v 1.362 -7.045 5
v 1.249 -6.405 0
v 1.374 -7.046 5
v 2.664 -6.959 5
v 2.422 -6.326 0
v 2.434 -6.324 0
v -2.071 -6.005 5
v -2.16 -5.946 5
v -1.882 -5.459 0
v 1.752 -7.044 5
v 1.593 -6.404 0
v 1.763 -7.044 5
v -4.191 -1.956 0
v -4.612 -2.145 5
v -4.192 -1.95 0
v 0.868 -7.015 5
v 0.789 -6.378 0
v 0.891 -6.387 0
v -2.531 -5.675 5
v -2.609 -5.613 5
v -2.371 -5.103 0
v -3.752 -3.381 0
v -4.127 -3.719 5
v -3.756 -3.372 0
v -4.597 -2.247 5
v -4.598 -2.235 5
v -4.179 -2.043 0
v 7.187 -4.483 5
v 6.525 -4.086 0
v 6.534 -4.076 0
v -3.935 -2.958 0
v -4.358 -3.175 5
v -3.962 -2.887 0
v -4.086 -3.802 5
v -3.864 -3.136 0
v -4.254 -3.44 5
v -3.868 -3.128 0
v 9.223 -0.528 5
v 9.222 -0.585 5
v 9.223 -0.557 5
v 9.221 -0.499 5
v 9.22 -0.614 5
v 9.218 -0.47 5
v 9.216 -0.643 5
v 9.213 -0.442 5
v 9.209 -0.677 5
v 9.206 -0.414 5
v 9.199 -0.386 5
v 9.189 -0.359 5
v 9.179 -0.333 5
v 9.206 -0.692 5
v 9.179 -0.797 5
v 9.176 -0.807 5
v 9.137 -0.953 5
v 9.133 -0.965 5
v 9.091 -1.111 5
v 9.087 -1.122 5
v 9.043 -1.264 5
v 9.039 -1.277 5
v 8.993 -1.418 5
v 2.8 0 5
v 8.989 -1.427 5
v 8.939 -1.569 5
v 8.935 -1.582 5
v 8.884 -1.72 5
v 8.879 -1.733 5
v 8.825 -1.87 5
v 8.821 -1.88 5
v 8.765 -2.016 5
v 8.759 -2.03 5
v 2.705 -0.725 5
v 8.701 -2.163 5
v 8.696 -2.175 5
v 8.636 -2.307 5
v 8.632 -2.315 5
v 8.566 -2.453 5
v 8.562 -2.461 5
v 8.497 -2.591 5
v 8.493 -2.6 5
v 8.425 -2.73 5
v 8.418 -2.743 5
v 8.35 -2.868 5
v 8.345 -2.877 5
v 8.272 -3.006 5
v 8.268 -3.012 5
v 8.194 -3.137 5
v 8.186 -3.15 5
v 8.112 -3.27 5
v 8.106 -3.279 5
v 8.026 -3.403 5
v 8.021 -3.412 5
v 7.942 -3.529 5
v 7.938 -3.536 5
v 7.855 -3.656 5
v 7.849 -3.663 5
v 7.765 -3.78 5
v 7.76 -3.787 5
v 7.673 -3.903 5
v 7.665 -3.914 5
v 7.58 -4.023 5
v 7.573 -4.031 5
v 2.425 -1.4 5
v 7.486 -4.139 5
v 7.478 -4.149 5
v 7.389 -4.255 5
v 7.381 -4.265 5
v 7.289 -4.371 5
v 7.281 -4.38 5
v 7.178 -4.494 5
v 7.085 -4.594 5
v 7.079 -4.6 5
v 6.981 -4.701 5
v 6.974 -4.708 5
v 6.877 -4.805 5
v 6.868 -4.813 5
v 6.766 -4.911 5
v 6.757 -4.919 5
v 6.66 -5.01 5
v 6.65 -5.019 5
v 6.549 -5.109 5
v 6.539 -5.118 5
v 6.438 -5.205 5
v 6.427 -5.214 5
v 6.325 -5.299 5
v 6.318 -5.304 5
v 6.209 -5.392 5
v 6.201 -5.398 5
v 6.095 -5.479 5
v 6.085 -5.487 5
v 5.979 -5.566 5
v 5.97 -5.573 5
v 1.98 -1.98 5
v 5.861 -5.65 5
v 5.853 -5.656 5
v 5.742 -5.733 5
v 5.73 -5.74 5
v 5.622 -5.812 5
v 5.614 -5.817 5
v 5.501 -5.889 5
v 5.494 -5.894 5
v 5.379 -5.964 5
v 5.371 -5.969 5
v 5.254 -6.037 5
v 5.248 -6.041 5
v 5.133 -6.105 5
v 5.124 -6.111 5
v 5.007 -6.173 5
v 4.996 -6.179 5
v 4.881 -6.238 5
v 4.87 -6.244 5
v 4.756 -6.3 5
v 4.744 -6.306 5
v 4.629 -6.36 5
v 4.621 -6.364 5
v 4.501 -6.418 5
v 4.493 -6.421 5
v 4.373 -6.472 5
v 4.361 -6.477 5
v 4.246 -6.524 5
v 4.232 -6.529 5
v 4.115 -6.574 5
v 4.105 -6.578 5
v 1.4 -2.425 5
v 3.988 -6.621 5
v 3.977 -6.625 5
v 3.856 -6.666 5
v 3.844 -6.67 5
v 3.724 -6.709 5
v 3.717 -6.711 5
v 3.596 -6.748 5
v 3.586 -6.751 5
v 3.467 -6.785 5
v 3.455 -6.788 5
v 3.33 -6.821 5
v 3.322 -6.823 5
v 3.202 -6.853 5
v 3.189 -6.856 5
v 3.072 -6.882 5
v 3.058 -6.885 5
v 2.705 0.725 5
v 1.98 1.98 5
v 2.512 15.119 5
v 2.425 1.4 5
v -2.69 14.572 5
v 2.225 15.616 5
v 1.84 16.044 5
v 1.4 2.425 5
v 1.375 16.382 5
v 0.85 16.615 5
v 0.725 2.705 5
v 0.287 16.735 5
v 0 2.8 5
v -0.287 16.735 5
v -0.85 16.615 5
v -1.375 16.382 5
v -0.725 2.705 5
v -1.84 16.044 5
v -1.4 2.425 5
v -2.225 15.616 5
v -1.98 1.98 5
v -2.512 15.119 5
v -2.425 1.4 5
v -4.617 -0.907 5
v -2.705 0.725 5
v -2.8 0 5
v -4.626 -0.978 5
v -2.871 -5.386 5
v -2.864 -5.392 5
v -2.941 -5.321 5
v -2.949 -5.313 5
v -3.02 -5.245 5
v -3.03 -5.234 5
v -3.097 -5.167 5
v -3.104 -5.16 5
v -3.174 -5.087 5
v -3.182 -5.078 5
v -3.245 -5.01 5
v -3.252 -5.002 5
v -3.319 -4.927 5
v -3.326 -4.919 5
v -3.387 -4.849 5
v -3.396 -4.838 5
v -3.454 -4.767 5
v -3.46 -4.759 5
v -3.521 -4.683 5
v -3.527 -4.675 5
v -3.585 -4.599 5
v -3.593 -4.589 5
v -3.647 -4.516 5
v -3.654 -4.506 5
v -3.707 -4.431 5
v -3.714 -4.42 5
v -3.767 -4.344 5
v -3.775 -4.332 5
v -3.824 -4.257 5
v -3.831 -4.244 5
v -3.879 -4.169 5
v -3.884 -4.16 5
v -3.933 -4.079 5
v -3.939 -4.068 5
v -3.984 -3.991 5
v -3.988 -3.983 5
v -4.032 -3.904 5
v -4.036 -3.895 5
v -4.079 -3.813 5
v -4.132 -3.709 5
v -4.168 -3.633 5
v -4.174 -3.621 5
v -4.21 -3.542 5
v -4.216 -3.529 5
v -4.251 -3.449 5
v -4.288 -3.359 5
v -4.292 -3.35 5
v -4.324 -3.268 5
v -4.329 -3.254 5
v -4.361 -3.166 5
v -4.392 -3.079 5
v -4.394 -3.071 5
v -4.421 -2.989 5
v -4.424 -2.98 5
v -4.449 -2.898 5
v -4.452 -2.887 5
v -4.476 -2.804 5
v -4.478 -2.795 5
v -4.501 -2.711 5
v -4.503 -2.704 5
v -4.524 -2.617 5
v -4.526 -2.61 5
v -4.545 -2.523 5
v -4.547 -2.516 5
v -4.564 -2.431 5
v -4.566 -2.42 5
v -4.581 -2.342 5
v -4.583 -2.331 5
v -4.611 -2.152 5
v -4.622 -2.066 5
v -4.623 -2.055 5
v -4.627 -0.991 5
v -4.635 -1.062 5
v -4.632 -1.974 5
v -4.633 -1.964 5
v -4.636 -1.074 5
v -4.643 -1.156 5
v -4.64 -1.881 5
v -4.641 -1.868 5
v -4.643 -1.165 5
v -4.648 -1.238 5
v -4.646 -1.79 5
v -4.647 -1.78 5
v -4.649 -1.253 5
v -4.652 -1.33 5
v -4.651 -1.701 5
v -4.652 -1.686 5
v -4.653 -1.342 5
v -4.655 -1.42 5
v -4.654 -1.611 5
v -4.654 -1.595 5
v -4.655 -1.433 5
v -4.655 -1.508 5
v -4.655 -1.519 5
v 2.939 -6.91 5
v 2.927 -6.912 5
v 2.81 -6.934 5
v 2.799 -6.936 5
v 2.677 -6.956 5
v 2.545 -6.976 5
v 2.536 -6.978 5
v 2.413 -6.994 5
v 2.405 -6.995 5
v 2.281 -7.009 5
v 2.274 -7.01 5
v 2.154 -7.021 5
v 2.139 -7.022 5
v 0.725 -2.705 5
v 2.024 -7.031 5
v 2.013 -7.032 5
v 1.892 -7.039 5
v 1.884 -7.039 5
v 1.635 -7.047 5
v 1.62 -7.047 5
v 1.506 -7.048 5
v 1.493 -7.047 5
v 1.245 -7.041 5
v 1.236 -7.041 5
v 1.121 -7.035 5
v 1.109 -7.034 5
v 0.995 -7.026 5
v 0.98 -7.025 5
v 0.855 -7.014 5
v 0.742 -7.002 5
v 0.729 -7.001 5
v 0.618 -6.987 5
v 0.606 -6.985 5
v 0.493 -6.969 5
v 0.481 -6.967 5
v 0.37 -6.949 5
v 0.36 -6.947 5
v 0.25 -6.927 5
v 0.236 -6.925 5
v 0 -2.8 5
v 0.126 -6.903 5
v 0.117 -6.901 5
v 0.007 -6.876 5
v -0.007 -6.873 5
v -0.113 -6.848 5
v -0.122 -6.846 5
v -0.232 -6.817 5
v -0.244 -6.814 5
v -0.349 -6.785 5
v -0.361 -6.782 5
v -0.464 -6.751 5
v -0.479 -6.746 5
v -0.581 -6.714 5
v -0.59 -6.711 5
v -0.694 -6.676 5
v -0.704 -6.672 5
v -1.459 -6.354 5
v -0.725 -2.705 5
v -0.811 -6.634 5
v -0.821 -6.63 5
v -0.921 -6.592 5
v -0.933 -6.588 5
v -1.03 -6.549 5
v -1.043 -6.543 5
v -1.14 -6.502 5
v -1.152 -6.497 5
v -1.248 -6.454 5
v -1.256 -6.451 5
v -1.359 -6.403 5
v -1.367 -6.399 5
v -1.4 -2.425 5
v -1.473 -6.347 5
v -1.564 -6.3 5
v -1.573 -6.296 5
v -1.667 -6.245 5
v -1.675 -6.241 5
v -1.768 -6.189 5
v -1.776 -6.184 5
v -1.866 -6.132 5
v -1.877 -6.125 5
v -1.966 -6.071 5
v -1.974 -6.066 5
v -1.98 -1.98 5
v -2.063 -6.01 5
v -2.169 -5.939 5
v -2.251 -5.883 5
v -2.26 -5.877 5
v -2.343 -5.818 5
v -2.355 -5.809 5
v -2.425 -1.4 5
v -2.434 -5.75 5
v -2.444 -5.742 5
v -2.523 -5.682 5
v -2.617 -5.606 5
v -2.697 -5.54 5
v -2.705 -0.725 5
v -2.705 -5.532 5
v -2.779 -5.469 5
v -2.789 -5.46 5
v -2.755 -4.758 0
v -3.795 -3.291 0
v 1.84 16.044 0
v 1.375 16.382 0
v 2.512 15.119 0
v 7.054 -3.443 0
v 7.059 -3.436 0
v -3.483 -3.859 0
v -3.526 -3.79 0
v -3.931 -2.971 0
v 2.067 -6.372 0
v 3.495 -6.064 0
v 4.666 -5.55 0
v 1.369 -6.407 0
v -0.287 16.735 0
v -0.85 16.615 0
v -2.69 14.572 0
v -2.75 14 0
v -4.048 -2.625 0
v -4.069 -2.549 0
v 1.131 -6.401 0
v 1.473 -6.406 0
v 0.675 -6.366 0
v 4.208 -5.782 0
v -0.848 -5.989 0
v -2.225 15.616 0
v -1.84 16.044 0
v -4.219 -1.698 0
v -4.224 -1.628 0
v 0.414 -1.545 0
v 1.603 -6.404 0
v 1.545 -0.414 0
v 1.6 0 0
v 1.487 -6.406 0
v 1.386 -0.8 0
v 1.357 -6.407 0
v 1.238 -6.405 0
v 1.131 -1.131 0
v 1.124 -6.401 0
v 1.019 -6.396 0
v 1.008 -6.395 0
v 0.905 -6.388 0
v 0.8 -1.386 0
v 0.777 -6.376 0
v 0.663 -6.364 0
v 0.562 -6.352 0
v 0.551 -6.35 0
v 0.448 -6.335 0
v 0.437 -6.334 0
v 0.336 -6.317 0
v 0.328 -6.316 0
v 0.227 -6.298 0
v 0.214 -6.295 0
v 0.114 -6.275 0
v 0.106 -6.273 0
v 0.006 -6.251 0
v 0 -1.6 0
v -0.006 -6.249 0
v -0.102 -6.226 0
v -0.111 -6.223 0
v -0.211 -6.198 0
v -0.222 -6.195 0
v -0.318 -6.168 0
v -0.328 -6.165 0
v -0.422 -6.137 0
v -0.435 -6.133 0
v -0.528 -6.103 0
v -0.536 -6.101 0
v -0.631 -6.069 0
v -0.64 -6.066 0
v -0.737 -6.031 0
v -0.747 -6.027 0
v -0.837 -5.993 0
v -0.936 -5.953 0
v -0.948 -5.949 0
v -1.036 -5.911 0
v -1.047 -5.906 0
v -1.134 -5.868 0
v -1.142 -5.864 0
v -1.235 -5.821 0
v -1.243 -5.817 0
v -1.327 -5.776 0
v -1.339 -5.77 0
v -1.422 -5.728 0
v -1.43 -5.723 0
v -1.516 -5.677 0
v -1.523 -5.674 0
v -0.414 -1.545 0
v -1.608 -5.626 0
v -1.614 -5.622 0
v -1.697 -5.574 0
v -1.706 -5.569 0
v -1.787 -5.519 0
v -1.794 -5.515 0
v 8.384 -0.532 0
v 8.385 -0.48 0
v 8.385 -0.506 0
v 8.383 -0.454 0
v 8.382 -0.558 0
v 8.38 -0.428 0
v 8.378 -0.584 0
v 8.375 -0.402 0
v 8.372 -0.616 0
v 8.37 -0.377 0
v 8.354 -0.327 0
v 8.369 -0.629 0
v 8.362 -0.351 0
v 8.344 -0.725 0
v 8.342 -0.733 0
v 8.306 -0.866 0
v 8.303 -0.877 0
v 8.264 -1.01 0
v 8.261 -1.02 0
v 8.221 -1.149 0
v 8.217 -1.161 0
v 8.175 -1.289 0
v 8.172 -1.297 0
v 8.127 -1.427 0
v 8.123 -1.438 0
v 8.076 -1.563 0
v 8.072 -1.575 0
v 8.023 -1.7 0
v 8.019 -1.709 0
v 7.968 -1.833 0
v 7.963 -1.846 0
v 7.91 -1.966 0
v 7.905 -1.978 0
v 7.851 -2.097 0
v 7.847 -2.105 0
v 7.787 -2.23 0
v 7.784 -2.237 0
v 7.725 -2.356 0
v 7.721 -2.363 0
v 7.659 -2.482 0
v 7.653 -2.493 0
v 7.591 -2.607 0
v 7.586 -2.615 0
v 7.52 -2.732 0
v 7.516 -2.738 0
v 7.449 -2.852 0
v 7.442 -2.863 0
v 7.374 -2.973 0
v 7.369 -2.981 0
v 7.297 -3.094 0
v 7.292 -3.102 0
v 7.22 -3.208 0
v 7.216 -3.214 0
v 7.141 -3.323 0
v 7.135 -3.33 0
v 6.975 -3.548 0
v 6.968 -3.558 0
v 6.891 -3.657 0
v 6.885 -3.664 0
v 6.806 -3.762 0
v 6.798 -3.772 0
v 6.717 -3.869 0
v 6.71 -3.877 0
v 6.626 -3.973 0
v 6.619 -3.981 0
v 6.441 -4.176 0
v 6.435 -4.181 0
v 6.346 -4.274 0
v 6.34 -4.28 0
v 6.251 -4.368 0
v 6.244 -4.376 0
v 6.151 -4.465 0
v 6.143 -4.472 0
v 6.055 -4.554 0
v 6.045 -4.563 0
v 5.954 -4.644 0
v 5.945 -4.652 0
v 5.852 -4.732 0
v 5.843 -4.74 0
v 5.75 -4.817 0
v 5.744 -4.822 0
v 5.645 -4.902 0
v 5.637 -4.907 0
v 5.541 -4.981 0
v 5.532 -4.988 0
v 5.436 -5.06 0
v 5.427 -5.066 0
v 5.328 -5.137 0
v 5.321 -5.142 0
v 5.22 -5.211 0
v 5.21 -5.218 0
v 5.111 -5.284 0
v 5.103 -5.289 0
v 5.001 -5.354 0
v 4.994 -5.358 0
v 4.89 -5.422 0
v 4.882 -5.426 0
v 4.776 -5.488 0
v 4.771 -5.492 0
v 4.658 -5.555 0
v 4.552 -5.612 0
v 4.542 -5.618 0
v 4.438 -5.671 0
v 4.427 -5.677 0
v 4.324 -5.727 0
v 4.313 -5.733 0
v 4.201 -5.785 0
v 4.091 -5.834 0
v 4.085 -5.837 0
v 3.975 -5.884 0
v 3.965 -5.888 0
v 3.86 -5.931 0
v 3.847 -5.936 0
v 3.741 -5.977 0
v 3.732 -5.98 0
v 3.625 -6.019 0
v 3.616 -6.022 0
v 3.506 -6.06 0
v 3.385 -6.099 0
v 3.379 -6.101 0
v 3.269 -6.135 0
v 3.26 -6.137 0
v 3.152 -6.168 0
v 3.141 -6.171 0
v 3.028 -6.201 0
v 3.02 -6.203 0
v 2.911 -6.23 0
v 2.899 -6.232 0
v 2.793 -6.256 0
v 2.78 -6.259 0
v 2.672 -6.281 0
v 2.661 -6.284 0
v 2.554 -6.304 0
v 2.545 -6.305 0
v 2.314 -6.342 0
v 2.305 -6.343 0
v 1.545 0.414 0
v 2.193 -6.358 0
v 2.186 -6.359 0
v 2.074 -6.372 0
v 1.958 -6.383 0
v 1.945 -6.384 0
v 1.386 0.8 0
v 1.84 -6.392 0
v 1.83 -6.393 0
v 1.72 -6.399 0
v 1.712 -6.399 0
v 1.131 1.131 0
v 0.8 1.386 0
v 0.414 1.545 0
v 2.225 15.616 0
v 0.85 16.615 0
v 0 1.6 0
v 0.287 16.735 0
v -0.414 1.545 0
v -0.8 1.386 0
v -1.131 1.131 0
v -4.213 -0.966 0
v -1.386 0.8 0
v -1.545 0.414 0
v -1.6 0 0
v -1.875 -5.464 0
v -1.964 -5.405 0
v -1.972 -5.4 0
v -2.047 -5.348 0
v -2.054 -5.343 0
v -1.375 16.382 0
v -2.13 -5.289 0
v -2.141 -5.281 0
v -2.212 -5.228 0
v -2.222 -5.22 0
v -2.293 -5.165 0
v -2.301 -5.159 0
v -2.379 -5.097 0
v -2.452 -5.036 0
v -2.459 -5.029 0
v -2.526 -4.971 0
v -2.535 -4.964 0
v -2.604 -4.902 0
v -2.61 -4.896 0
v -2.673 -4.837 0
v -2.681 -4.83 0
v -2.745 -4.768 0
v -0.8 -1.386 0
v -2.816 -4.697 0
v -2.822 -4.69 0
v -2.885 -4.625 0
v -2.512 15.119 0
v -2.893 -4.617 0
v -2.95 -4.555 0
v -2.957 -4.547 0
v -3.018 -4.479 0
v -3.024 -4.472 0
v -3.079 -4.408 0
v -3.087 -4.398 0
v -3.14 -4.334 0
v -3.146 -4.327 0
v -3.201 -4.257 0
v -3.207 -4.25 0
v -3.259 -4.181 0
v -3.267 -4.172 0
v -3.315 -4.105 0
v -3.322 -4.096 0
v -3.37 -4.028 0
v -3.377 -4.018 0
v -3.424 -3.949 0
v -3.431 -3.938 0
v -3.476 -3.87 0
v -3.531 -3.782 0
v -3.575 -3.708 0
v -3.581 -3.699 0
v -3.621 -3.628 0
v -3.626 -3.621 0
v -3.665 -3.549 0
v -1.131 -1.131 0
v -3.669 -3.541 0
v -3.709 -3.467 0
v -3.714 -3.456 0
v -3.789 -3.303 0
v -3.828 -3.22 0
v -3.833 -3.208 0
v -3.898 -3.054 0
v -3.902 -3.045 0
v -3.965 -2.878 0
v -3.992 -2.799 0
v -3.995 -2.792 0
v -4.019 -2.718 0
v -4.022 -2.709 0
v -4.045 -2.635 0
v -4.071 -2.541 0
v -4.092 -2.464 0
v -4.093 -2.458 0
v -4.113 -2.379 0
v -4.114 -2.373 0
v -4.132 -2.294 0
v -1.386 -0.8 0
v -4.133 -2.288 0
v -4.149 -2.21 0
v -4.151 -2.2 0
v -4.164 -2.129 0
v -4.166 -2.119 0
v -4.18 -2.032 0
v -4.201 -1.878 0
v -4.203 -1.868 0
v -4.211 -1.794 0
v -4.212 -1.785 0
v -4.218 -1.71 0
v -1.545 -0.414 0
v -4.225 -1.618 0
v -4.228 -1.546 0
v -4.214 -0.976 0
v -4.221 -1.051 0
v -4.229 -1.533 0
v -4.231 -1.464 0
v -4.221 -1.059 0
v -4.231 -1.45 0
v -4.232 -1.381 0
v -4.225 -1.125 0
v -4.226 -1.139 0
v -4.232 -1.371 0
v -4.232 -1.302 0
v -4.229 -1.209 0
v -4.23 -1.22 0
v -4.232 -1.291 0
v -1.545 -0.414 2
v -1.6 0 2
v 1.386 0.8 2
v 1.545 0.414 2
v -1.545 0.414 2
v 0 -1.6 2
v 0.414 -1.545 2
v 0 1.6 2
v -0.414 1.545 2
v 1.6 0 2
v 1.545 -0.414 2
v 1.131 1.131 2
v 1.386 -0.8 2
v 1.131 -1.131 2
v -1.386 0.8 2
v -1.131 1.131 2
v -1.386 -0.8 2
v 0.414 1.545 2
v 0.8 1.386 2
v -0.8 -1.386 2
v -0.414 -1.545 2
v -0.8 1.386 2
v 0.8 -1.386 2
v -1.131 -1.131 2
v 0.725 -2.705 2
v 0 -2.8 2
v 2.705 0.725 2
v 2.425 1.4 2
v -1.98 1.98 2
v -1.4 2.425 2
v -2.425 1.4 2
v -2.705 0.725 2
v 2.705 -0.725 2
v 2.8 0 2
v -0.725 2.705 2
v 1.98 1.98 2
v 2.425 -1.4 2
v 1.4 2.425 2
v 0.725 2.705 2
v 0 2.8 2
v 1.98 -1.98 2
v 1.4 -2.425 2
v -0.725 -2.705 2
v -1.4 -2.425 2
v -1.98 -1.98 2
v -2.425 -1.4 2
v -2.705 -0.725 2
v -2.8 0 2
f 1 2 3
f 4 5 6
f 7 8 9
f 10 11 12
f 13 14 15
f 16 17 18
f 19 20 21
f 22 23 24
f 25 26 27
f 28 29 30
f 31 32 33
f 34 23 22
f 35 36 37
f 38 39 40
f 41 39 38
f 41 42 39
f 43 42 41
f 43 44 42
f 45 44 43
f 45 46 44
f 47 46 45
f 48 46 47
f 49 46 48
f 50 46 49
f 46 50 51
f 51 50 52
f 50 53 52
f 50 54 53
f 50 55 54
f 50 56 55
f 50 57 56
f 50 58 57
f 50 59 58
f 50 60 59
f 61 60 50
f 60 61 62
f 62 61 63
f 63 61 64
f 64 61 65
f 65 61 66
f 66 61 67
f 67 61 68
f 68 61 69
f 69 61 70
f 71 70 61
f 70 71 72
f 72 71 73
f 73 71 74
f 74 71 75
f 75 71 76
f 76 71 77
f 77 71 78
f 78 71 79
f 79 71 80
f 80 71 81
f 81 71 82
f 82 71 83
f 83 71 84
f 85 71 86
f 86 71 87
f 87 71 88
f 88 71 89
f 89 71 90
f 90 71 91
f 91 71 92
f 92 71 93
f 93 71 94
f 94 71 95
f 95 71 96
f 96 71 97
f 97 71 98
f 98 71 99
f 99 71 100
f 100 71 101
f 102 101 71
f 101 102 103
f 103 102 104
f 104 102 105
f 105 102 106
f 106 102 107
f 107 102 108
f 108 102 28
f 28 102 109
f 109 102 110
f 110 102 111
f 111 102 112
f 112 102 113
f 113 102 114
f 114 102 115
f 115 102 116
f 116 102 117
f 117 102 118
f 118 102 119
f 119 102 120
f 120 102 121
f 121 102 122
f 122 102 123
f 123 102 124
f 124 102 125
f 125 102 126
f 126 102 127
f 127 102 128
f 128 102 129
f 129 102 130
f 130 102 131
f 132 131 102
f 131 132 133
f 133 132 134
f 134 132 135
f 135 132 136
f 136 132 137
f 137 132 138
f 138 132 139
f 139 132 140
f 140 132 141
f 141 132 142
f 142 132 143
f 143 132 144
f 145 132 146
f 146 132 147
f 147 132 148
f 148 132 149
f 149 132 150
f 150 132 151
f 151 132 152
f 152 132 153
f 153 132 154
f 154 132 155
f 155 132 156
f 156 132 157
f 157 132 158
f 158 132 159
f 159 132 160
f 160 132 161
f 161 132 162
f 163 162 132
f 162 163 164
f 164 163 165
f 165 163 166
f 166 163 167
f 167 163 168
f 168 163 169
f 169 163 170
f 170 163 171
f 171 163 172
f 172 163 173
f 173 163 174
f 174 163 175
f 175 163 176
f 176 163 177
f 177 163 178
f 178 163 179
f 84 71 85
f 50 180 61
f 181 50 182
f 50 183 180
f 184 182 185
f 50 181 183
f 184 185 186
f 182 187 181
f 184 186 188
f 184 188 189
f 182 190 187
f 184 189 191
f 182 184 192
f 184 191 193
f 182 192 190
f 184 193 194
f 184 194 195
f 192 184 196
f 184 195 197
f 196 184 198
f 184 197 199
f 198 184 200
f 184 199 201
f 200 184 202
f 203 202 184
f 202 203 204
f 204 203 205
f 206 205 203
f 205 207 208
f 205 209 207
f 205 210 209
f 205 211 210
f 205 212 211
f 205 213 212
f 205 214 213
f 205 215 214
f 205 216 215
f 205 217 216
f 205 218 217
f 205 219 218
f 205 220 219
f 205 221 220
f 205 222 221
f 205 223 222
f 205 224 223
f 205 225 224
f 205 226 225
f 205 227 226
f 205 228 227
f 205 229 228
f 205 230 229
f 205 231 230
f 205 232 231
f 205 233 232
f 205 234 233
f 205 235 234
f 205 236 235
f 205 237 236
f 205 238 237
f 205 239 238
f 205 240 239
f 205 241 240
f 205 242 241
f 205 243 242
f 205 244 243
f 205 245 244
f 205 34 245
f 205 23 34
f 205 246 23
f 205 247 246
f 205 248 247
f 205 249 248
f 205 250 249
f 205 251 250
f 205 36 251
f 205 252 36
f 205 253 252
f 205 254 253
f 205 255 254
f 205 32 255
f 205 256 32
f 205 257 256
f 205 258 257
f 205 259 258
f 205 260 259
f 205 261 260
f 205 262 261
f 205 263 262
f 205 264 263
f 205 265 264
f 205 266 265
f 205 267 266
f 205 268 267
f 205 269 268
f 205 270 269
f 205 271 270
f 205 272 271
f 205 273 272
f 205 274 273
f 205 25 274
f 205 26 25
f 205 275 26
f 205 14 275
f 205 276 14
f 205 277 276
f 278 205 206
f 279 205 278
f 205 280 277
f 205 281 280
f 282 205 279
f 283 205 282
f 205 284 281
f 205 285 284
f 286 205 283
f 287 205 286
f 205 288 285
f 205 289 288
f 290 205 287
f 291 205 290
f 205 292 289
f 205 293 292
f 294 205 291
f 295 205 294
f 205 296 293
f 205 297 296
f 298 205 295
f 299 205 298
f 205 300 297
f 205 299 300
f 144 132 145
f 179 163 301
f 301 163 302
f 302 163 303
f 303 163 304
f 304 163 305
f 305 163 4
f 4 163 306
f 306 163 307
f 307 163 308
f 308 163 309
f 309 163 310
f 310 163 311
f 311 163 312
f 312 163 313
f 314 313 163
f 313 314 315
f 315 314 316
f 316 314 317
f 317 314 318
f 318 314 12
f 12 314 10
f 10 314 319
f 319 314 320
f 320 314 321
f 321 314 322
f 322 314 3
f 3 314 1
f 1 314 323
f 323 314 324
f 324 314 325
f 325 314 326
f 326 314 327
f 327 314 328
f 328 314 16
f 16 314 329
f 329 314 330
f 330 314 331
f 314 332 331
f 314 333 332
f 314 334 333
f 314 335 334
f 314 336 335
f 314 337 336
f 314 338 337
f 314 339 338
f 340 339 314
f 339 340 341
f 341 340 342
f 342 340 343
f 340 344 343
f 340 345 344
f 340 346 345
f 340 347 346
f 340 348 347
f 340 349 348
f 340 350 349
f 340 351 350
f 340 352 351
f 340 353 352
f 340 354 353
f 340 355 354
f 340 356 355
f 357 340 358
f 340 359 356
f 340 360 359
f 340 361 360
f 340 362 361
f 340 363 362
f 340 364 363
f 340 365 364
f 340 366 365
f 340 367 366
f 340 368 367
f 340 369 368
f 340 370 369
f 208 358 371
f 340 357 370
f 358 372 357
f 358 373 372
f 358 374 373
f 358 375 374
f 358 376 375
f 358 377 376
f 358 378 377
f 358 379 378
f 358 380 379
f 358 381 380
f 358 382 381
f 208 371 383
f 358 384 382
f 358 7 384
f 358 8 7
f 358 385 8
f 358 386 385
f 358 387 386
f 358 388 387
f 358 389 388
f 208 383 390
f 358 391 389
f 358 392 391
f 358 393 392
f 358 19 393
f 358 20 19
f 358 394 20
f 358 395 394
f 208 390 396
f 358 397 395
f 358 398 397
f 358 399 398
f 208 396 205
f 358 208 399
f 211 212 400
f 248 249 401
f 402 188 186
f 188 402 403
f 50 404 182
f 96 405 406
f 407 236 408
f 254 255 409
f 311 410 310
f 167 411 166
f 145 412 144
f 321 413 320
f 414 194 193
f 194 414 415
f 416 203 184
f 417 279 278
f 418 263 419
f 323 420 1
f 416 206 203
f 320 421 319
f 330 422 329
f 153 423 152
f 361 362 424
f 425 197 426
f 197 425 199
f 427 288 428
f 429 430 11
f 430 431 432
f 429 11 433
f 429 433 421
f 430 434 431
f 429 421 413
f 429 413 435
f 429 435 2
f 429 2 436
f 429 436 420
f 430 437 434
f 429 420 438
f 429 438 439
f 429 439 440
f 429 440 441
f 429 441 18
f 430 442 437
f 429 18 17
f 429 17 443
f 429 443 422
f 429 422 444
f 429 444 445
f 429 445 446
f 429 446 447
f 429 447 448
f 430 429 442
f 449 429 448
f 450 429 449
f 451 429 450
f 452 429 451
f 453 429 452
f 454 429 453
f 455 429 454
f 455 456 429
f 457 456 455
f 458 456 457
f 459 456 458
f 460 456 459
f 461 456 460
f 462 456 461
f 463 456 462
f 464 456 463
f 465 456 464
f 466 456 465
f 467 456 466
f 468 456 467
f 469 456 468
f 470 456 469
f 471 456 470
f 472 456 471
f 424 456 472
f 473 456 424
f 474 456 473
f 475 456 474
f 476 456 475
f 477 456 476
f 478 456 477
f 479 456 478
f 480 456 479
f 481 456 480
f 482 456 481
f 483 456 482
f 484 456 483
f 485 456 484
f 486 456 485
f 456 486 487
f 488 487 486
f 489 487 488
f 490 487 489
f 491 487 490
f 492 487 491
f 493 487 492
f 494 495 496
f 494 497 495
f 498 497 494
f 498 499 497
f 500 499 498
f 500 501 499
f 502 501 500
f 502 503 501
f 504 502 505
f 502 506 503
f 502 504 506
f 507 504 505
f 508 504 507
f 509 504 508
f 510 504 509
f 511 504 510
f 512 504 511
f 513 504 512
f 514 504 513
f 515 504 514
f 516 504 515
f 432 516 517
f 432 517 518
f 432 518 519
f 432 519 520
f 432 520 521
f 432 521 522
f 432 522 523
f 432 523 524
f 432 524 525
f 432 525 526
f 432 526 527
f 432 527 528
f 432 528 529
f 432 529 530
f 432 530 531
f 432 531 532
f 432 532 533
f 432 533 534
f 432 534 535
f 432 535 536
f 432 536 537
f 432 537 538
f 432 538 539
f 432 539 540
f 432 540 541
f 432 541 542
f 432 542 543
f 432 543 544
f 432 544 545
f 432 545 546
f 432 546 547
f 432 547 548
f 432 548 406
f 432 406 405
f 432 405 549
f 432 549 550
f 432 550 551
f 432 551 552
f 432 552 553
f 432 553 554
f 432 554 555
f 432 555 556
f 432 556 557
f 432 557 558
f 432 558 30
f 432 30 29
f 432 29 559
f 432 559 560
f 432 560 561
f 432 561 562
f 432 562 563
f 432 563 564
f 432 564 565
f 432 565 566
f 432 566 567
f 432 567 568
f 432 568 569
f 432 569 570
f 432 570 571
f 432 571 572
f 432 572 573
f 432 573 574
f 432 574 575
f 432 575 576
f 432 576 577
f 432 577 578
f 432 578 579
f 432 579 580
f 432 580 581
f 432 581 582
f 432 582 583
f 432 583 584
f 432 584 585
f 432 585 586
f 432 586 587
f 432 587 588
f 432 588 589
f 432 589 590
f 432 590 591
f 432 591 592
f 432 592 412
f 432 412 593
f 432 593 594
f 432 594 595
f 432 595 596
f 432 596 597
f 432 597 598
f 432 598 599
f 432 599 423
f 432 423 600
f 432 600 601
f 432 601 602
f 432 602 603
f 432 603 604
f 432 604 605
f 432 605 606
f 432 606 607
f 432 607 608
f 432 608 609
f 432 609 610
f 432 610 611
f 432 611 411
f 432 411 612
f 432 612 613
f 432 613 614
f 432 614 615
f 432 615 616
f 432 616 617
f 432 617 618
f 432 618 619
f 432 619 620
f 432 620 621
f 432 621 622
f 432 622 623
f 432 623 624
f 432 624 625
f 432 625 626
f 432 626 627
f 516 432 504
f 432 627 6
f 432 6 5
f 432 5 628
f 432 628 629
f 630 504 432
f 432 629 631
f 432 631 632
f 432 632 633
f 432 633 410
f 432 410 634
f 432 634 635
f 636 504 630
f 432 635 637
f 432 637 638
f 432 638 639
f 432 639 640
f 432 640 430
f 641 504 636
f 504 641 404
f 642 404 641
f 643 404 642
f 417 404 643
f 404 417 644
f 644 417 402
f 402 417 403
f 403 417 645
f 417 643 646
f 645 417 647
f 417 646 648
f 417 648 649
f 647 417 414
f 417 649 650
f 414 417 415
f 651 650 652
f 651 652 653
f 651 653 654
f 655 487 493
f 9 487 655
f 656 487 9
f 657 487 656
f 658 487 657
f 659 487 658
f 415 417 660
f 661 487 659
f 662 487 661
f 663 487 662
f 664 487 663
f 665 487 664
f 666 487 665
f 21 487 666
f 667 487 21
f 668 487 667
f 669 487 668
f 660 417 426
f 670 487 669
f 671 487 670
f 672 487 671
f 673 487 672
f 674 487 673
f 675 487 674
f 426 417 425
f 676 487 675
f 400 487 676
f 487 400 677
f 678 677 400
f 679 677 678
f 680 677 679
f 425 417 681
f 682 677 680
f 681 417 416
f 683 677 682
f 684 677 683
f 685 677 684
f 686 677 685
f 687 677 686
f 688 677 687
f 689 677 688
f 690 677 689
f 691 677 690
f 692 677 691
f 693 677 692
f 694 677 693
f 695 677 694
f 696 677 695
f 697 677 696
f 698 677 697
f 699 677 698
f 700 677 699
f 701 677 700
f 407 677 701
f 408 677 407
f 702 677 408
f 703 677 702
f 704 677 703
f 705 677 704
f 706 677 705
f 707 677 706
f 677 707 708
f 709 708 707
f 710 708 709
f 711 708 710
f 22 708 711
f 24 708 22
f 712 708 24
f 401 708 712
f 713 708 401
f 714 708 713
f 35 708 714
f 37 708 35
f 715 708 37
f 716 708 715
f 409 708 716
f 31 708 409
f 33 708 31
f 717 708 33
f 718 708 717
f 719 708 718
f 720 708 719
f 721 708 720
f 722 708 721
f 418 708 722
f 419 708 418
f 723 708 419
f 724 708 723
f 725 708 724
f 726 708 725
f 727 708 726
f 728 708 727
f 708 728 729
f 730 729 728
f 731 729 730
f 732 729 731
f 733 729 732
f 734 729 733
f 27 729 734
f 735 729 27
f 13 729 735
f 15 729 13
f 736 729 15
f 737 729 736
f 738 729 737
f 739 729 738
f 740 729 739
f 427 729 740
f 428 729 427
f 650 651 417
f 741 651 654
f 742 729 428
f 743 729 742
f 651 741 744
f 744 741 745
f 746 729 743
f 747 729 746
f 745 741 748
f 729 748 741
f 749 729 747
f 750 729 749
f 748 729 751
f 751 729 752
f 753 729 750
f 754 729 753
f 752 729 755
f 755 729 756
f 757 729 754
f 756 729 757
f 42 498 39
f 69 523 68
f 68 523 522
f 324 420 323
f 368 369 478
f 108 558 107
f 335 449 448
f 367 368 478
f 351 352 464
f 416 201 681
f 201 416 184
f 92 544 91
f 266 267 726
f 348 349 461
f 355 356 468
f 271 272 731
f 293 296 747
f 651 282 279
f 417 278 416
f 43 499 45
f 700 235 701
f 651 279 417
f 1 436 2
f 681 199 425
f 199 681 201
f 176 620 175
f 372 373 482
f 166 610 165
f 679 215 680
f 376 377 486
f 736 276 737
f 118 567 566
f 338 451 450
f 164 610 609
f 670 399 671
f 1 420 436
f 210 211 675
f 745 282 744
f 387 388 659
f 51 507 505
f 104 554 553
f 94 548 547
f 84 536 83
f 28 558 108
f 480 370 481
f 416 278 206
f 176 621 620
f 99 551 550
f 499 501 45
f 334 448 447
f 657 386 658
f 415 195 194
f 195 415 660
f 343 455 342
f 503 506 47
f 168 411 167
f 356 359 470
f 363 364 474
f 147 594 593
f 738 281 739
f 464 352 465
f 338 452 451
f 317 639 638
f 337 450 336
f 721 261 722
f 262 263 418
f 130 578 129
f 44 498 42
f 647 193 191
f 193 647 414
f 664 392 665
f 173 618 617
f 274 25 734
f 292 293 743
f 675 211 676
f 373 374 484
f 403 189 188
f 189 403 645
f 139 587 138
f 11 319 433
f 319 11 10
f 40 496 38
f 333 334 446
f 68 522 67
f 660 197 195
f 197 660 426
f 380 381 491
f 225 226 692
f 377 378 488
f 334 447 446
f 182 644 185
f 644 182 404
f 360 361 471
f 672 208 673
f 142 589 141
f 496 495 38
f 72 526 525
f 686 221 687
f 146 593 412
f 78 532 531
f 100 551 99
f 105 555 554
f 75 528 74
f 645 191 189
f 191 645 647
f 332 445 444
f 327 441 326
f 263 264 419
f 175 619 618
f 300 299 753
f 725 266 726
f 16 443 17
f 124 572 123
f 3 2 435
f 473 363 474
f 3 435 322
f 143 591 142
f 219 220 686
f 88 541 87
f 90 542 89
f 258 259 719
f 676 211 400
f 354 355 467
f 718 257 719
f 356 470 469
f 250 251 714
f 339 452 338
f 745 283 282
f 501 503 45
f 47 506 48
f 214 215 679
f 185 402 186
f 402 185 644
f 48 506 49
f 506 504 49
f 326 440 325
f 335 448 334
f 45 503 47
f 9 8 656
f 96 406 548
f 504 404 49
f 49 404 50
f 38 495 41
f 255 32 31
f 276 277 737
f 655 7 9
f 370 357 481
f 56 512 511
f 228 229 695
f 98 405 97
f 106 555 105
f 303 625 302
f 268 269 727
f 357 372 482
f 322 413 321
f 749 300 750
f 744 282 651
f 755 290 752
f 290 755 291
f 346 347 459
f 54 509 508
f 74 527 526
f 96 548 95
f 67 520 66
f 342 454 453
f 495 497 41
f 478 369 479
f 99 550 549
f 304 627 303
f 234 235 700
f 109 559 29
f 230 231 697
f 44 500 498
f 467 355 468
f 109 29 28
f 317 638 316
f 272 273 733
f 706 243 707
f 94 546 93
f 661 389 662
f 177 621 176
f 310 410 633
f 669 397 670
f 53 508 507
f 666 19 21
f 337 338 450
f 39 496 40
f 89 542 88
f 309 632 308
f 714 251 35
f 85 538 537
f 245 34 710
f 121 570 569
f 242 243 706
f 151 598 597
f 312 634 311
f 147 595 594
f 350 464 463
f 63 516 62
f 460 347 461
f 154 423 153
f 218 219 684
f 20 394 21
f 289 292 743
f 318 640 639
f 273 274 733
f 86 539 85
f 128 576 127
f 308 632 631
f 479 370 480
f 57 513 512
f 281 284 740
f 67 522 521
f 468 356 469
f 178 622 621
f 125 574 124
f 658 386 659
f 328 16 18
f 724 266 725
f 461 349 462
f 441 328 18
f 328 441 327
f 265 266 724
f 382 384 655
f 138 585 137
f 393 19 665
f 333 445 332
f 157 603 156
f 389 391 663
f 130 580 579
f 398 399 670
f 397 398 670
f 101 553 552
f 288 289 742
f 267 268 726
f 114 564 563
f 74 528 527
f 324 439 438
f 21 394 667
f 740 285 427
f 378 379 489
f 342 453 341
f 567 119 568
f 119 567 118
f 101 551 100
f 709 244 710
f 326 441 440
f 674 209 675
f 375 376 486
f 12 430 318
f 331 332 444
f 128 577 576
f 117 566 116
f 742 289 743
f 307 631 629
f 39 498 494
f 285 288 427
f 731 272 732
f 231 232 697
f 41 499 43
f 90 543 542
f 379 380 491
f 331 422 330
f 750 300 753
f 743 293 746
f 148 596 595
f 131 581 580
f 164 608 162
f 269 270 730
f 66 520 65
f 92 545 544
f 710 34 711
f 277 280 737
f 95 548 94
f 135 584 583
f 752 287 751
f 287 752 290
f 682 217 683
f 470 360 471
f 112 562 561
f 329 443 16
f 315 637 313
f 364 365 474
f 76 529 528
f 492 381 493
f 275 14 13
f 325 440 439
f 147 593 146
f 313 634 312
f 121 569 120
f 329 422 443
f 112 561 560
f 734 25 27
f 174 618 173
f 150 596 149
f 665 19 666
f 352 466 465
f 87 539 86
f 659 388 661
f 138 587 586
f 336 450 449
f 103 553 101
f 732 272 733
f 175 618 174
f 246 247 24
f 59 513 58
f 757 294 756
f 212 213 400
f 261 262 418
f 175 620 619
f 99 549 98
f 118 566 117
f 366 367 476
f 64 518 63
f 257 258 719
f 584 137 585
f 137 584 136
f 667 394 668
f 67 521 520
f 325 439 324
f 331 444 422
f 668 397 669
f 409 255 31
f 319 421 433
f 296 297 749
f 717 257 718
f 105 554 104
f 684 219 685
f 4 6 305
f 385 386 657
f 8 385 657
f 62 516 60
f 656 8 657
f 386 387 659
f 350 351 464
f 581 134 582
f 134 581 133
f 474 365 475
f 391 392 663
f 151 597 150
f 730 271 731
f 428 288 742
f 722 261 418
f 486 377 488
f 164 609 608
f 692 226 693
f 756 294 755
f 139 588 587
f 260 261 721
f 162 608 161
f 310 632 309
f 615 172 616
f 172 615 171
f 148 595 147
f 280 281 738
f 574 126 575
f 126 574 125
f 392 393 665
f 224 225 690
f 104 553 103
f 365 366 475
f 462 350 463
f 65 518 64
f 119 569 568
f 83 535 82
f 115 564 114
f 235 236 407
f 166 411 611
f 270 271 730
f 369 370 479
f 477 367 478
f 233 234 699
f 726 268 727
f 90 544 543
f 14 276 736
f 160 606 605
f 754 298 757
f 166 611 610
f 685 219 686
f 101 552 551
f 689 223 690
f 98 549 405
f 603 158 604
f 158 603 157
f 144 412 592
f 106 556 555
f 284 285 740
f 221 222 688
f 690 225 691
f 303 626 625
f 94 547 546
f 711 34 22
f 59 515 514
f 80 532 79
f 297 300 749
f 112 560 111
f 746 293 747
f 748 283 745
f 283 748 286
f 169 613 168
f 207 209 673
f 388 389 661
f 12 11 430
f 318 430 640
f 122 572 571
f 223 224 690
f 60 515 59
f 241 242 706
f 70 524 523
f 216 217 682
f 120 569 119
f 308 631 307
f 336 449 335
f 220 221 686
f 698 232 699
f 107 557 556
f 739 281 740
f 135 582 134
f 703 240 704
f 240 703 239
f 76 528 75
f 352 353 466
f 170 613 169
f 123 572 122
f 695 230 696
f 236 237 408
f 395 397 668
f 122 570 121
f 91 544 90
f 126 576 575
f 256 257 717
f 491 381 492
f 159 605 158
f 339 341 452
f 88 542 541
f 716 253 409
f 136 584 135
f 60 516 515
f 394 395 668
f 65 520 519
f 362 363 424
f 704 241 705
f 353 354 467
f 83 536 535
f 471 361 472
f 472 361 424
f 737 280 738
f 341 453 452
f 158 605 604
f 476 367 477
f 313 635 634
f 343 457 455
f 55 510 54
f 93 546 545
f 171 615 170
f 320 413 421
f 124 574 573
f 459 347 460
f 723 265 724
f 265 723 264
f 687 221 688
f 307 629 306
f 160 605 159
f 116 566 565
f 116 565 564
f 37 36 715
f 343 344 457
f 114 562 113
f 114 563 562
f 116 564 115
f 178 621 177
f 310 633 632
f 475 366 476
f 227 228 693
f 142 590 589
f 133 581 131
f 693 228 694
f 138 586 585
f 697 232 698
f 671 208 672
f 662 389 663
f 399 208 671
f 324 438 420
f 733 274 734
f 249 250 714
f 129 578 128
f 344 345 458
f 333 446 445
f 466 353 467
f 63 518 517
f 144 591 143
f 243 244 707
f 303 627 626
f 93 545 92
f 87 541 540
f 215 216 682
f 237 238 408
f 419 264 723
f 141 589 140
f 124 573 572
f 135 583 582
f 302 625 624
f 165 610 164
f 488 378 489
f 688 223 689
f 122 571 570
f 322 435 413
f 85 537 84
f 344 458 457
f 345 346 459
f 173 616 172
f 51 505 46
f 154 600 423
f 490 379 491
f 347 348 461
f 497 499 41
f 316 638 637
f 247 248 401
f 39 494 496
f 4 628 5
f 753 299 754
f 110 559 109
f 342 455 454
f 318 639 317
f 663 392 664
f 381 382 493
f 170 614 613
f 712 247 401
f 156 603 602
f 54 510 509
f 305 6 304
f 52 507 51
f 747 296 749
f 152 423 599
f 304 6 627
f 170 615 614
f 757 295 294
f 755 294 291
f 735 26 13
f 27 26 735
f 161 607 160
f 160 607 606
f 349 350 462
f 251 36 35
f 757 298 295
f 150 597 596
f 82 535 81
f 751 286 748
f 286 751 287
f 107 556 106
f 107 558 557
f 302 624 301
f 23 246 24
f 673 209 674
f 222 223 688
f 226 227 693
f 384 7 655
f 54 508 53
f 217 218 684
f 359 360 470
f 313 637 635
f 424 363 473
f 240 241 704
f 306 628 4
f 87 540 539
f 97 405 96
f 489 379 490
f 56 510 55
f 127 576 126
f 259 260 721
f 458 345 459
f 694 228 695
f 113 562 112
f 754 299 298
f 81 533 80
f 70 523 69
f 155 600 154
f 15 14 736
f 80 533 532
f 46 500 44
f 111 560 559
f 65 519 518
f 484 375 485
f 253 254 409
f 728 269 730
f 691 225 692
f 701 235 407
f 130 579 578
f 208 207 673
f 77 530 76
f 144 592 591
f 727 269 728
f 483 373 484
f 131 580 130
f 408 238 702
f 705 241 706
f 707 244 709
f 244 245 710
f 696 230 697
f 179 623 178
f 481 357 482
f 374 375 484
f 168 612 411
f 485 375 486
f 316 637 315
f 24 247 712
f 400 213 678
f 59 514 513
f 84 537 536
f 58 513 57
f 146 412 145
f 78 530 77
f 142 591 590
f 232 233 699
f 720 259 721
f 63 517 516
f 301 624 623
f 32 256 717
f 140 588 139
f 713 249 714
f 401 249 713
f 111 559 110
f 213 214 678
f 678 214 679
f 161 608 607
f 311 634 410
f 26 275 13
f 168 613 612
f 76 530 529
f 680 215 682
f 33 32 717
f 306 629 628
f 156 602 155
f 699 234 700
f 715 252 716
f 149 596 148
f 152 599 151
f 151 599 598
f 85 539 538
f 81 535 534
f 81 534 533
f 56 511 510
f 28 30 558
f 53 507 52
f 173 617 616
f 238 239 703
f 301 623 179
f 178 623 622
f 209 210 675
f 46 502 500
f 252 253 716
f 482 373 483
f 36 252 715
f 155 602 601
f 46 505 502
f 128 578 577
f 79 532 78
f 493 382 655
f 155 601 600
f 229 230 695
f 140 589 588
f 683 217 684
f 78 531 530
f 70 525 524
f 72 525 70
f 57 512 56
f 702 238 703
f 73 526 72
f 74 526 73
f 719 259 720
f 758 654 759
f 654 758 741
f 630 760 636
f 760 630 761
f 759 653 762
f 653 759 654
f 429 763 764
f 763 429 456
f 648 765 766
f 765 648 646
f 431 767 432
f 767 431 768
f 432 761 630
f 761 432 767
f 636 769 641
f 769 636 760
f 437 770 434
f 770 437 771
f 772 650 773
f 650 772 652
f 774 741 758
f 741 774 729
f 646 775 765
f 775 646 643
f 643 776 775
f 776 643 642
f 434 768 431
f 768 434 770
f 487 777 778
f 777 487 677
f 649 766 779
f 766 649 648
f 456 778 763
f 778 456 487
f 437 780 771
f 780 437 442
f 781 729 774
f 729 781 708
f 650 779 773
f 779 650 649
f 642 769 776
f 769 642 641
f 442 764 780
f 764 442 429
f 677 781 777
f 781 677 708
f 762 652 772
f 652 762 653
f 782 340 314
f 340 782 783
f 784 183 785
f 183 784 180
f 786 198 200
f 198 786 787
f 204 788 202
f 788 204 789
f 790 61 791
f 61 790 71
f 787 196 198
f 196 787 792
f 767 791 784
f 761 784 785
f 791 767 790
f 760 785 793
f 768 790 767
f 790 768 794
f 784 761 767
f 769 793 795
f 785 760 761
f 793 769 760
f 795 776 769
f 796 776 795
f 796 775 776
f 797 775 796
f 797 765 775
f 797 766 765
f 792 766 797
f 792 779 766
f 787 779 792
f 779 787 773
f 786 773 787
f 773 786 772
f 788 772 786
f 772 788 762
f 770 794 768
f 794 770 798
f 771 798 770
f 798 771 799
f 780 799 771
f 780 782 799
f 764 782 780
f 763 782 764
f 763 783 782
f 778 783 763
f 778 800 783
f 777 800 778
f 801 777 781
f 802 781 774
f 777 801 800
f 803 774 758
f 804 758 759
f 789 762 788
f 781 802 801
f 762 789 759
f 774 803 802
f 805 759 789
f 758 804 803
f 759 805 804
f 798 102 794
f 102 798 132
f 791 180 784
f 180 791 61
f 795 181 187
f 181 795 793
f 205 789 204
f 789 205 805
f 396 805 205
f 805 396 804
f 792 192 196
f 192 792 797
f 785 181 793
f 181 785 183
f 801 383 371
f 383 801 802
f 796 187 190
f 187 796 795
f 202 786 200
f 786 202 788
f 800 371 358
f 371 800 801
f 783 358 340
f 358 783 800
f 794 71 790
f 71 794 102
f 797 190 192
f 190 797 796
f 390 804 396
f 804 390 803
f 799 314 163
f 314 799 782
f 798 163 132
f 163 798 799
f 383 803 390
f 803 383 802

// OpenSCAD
screw_tolerance=.2; play_tolerance=.5; fit_tolerance=.1;

// Glass holder thickness (probably a bit thicker than your thickest glass).
thickness = 5;
// The minimum radius (something less than the distance between your biggest glass to the mounthole).
r0=4;
// The maximum radius (something a bit greather than the distance between your smallest glass to the mounthole).
r1=8.5;
// The diameter of the mount screw.
screw_diameter = 3;
// The diameter of the mount screw head (it's definitely better when smaller than the minimum radius).
screwhead_diameter = 5.5;
// The thickness of the screw head (you better make it less than the whole thing thickness).
screwhead_thickness = 3;
// The length of the handle
handle_length = 15;

fn=180;

module glassfit(r0=r0,r1=r1,fn=fn,thickness=thickness,sd=screw_diameter,shd=screwhead_diameter,sht=screwhead_thickness,handle=handle_length) {
 module shape(r0=r0,r1=r1,a0=0,a1=360) {
  polypoints = [
   for(a=[a0:(a1-a0)/fn:a1])
    let(r=r0+(r1-r0)*(a-a0)/(a1-a0)) [ r*cos(a),r*sin(a) ]
  ];
  r=.5;
  offset(r=-r,$fn=60) offset(r=+r,$fn=60)
  offset(r=r) offset(r=-r)
  polygon(polypoints);
 }
 module eshape(r0=r0,r1=r1,a0=0,a1=360) {
  linear_extrude(height=thickness,scale=1.1)
  shape(r0=r0,r1=r1,a0=a0,a1=a1);
 }
 difference() {
  if(handle) hull() {
   eshape(a0=180);
   translate([0,handle-1,0])
   cylinder(d=screwhead_diameter,h=thickness,$fn=30);
  } else eshape();
  translate([0,0,-1]) cylinder(d=sd+screw_tolerance,h=thickness+2,$fn=24);
  translate([0,0,thickness-sht]) cylinder(d=shd+fit_tolerance,h=sht+1,$fn=24);
 }
}

glassfit();
